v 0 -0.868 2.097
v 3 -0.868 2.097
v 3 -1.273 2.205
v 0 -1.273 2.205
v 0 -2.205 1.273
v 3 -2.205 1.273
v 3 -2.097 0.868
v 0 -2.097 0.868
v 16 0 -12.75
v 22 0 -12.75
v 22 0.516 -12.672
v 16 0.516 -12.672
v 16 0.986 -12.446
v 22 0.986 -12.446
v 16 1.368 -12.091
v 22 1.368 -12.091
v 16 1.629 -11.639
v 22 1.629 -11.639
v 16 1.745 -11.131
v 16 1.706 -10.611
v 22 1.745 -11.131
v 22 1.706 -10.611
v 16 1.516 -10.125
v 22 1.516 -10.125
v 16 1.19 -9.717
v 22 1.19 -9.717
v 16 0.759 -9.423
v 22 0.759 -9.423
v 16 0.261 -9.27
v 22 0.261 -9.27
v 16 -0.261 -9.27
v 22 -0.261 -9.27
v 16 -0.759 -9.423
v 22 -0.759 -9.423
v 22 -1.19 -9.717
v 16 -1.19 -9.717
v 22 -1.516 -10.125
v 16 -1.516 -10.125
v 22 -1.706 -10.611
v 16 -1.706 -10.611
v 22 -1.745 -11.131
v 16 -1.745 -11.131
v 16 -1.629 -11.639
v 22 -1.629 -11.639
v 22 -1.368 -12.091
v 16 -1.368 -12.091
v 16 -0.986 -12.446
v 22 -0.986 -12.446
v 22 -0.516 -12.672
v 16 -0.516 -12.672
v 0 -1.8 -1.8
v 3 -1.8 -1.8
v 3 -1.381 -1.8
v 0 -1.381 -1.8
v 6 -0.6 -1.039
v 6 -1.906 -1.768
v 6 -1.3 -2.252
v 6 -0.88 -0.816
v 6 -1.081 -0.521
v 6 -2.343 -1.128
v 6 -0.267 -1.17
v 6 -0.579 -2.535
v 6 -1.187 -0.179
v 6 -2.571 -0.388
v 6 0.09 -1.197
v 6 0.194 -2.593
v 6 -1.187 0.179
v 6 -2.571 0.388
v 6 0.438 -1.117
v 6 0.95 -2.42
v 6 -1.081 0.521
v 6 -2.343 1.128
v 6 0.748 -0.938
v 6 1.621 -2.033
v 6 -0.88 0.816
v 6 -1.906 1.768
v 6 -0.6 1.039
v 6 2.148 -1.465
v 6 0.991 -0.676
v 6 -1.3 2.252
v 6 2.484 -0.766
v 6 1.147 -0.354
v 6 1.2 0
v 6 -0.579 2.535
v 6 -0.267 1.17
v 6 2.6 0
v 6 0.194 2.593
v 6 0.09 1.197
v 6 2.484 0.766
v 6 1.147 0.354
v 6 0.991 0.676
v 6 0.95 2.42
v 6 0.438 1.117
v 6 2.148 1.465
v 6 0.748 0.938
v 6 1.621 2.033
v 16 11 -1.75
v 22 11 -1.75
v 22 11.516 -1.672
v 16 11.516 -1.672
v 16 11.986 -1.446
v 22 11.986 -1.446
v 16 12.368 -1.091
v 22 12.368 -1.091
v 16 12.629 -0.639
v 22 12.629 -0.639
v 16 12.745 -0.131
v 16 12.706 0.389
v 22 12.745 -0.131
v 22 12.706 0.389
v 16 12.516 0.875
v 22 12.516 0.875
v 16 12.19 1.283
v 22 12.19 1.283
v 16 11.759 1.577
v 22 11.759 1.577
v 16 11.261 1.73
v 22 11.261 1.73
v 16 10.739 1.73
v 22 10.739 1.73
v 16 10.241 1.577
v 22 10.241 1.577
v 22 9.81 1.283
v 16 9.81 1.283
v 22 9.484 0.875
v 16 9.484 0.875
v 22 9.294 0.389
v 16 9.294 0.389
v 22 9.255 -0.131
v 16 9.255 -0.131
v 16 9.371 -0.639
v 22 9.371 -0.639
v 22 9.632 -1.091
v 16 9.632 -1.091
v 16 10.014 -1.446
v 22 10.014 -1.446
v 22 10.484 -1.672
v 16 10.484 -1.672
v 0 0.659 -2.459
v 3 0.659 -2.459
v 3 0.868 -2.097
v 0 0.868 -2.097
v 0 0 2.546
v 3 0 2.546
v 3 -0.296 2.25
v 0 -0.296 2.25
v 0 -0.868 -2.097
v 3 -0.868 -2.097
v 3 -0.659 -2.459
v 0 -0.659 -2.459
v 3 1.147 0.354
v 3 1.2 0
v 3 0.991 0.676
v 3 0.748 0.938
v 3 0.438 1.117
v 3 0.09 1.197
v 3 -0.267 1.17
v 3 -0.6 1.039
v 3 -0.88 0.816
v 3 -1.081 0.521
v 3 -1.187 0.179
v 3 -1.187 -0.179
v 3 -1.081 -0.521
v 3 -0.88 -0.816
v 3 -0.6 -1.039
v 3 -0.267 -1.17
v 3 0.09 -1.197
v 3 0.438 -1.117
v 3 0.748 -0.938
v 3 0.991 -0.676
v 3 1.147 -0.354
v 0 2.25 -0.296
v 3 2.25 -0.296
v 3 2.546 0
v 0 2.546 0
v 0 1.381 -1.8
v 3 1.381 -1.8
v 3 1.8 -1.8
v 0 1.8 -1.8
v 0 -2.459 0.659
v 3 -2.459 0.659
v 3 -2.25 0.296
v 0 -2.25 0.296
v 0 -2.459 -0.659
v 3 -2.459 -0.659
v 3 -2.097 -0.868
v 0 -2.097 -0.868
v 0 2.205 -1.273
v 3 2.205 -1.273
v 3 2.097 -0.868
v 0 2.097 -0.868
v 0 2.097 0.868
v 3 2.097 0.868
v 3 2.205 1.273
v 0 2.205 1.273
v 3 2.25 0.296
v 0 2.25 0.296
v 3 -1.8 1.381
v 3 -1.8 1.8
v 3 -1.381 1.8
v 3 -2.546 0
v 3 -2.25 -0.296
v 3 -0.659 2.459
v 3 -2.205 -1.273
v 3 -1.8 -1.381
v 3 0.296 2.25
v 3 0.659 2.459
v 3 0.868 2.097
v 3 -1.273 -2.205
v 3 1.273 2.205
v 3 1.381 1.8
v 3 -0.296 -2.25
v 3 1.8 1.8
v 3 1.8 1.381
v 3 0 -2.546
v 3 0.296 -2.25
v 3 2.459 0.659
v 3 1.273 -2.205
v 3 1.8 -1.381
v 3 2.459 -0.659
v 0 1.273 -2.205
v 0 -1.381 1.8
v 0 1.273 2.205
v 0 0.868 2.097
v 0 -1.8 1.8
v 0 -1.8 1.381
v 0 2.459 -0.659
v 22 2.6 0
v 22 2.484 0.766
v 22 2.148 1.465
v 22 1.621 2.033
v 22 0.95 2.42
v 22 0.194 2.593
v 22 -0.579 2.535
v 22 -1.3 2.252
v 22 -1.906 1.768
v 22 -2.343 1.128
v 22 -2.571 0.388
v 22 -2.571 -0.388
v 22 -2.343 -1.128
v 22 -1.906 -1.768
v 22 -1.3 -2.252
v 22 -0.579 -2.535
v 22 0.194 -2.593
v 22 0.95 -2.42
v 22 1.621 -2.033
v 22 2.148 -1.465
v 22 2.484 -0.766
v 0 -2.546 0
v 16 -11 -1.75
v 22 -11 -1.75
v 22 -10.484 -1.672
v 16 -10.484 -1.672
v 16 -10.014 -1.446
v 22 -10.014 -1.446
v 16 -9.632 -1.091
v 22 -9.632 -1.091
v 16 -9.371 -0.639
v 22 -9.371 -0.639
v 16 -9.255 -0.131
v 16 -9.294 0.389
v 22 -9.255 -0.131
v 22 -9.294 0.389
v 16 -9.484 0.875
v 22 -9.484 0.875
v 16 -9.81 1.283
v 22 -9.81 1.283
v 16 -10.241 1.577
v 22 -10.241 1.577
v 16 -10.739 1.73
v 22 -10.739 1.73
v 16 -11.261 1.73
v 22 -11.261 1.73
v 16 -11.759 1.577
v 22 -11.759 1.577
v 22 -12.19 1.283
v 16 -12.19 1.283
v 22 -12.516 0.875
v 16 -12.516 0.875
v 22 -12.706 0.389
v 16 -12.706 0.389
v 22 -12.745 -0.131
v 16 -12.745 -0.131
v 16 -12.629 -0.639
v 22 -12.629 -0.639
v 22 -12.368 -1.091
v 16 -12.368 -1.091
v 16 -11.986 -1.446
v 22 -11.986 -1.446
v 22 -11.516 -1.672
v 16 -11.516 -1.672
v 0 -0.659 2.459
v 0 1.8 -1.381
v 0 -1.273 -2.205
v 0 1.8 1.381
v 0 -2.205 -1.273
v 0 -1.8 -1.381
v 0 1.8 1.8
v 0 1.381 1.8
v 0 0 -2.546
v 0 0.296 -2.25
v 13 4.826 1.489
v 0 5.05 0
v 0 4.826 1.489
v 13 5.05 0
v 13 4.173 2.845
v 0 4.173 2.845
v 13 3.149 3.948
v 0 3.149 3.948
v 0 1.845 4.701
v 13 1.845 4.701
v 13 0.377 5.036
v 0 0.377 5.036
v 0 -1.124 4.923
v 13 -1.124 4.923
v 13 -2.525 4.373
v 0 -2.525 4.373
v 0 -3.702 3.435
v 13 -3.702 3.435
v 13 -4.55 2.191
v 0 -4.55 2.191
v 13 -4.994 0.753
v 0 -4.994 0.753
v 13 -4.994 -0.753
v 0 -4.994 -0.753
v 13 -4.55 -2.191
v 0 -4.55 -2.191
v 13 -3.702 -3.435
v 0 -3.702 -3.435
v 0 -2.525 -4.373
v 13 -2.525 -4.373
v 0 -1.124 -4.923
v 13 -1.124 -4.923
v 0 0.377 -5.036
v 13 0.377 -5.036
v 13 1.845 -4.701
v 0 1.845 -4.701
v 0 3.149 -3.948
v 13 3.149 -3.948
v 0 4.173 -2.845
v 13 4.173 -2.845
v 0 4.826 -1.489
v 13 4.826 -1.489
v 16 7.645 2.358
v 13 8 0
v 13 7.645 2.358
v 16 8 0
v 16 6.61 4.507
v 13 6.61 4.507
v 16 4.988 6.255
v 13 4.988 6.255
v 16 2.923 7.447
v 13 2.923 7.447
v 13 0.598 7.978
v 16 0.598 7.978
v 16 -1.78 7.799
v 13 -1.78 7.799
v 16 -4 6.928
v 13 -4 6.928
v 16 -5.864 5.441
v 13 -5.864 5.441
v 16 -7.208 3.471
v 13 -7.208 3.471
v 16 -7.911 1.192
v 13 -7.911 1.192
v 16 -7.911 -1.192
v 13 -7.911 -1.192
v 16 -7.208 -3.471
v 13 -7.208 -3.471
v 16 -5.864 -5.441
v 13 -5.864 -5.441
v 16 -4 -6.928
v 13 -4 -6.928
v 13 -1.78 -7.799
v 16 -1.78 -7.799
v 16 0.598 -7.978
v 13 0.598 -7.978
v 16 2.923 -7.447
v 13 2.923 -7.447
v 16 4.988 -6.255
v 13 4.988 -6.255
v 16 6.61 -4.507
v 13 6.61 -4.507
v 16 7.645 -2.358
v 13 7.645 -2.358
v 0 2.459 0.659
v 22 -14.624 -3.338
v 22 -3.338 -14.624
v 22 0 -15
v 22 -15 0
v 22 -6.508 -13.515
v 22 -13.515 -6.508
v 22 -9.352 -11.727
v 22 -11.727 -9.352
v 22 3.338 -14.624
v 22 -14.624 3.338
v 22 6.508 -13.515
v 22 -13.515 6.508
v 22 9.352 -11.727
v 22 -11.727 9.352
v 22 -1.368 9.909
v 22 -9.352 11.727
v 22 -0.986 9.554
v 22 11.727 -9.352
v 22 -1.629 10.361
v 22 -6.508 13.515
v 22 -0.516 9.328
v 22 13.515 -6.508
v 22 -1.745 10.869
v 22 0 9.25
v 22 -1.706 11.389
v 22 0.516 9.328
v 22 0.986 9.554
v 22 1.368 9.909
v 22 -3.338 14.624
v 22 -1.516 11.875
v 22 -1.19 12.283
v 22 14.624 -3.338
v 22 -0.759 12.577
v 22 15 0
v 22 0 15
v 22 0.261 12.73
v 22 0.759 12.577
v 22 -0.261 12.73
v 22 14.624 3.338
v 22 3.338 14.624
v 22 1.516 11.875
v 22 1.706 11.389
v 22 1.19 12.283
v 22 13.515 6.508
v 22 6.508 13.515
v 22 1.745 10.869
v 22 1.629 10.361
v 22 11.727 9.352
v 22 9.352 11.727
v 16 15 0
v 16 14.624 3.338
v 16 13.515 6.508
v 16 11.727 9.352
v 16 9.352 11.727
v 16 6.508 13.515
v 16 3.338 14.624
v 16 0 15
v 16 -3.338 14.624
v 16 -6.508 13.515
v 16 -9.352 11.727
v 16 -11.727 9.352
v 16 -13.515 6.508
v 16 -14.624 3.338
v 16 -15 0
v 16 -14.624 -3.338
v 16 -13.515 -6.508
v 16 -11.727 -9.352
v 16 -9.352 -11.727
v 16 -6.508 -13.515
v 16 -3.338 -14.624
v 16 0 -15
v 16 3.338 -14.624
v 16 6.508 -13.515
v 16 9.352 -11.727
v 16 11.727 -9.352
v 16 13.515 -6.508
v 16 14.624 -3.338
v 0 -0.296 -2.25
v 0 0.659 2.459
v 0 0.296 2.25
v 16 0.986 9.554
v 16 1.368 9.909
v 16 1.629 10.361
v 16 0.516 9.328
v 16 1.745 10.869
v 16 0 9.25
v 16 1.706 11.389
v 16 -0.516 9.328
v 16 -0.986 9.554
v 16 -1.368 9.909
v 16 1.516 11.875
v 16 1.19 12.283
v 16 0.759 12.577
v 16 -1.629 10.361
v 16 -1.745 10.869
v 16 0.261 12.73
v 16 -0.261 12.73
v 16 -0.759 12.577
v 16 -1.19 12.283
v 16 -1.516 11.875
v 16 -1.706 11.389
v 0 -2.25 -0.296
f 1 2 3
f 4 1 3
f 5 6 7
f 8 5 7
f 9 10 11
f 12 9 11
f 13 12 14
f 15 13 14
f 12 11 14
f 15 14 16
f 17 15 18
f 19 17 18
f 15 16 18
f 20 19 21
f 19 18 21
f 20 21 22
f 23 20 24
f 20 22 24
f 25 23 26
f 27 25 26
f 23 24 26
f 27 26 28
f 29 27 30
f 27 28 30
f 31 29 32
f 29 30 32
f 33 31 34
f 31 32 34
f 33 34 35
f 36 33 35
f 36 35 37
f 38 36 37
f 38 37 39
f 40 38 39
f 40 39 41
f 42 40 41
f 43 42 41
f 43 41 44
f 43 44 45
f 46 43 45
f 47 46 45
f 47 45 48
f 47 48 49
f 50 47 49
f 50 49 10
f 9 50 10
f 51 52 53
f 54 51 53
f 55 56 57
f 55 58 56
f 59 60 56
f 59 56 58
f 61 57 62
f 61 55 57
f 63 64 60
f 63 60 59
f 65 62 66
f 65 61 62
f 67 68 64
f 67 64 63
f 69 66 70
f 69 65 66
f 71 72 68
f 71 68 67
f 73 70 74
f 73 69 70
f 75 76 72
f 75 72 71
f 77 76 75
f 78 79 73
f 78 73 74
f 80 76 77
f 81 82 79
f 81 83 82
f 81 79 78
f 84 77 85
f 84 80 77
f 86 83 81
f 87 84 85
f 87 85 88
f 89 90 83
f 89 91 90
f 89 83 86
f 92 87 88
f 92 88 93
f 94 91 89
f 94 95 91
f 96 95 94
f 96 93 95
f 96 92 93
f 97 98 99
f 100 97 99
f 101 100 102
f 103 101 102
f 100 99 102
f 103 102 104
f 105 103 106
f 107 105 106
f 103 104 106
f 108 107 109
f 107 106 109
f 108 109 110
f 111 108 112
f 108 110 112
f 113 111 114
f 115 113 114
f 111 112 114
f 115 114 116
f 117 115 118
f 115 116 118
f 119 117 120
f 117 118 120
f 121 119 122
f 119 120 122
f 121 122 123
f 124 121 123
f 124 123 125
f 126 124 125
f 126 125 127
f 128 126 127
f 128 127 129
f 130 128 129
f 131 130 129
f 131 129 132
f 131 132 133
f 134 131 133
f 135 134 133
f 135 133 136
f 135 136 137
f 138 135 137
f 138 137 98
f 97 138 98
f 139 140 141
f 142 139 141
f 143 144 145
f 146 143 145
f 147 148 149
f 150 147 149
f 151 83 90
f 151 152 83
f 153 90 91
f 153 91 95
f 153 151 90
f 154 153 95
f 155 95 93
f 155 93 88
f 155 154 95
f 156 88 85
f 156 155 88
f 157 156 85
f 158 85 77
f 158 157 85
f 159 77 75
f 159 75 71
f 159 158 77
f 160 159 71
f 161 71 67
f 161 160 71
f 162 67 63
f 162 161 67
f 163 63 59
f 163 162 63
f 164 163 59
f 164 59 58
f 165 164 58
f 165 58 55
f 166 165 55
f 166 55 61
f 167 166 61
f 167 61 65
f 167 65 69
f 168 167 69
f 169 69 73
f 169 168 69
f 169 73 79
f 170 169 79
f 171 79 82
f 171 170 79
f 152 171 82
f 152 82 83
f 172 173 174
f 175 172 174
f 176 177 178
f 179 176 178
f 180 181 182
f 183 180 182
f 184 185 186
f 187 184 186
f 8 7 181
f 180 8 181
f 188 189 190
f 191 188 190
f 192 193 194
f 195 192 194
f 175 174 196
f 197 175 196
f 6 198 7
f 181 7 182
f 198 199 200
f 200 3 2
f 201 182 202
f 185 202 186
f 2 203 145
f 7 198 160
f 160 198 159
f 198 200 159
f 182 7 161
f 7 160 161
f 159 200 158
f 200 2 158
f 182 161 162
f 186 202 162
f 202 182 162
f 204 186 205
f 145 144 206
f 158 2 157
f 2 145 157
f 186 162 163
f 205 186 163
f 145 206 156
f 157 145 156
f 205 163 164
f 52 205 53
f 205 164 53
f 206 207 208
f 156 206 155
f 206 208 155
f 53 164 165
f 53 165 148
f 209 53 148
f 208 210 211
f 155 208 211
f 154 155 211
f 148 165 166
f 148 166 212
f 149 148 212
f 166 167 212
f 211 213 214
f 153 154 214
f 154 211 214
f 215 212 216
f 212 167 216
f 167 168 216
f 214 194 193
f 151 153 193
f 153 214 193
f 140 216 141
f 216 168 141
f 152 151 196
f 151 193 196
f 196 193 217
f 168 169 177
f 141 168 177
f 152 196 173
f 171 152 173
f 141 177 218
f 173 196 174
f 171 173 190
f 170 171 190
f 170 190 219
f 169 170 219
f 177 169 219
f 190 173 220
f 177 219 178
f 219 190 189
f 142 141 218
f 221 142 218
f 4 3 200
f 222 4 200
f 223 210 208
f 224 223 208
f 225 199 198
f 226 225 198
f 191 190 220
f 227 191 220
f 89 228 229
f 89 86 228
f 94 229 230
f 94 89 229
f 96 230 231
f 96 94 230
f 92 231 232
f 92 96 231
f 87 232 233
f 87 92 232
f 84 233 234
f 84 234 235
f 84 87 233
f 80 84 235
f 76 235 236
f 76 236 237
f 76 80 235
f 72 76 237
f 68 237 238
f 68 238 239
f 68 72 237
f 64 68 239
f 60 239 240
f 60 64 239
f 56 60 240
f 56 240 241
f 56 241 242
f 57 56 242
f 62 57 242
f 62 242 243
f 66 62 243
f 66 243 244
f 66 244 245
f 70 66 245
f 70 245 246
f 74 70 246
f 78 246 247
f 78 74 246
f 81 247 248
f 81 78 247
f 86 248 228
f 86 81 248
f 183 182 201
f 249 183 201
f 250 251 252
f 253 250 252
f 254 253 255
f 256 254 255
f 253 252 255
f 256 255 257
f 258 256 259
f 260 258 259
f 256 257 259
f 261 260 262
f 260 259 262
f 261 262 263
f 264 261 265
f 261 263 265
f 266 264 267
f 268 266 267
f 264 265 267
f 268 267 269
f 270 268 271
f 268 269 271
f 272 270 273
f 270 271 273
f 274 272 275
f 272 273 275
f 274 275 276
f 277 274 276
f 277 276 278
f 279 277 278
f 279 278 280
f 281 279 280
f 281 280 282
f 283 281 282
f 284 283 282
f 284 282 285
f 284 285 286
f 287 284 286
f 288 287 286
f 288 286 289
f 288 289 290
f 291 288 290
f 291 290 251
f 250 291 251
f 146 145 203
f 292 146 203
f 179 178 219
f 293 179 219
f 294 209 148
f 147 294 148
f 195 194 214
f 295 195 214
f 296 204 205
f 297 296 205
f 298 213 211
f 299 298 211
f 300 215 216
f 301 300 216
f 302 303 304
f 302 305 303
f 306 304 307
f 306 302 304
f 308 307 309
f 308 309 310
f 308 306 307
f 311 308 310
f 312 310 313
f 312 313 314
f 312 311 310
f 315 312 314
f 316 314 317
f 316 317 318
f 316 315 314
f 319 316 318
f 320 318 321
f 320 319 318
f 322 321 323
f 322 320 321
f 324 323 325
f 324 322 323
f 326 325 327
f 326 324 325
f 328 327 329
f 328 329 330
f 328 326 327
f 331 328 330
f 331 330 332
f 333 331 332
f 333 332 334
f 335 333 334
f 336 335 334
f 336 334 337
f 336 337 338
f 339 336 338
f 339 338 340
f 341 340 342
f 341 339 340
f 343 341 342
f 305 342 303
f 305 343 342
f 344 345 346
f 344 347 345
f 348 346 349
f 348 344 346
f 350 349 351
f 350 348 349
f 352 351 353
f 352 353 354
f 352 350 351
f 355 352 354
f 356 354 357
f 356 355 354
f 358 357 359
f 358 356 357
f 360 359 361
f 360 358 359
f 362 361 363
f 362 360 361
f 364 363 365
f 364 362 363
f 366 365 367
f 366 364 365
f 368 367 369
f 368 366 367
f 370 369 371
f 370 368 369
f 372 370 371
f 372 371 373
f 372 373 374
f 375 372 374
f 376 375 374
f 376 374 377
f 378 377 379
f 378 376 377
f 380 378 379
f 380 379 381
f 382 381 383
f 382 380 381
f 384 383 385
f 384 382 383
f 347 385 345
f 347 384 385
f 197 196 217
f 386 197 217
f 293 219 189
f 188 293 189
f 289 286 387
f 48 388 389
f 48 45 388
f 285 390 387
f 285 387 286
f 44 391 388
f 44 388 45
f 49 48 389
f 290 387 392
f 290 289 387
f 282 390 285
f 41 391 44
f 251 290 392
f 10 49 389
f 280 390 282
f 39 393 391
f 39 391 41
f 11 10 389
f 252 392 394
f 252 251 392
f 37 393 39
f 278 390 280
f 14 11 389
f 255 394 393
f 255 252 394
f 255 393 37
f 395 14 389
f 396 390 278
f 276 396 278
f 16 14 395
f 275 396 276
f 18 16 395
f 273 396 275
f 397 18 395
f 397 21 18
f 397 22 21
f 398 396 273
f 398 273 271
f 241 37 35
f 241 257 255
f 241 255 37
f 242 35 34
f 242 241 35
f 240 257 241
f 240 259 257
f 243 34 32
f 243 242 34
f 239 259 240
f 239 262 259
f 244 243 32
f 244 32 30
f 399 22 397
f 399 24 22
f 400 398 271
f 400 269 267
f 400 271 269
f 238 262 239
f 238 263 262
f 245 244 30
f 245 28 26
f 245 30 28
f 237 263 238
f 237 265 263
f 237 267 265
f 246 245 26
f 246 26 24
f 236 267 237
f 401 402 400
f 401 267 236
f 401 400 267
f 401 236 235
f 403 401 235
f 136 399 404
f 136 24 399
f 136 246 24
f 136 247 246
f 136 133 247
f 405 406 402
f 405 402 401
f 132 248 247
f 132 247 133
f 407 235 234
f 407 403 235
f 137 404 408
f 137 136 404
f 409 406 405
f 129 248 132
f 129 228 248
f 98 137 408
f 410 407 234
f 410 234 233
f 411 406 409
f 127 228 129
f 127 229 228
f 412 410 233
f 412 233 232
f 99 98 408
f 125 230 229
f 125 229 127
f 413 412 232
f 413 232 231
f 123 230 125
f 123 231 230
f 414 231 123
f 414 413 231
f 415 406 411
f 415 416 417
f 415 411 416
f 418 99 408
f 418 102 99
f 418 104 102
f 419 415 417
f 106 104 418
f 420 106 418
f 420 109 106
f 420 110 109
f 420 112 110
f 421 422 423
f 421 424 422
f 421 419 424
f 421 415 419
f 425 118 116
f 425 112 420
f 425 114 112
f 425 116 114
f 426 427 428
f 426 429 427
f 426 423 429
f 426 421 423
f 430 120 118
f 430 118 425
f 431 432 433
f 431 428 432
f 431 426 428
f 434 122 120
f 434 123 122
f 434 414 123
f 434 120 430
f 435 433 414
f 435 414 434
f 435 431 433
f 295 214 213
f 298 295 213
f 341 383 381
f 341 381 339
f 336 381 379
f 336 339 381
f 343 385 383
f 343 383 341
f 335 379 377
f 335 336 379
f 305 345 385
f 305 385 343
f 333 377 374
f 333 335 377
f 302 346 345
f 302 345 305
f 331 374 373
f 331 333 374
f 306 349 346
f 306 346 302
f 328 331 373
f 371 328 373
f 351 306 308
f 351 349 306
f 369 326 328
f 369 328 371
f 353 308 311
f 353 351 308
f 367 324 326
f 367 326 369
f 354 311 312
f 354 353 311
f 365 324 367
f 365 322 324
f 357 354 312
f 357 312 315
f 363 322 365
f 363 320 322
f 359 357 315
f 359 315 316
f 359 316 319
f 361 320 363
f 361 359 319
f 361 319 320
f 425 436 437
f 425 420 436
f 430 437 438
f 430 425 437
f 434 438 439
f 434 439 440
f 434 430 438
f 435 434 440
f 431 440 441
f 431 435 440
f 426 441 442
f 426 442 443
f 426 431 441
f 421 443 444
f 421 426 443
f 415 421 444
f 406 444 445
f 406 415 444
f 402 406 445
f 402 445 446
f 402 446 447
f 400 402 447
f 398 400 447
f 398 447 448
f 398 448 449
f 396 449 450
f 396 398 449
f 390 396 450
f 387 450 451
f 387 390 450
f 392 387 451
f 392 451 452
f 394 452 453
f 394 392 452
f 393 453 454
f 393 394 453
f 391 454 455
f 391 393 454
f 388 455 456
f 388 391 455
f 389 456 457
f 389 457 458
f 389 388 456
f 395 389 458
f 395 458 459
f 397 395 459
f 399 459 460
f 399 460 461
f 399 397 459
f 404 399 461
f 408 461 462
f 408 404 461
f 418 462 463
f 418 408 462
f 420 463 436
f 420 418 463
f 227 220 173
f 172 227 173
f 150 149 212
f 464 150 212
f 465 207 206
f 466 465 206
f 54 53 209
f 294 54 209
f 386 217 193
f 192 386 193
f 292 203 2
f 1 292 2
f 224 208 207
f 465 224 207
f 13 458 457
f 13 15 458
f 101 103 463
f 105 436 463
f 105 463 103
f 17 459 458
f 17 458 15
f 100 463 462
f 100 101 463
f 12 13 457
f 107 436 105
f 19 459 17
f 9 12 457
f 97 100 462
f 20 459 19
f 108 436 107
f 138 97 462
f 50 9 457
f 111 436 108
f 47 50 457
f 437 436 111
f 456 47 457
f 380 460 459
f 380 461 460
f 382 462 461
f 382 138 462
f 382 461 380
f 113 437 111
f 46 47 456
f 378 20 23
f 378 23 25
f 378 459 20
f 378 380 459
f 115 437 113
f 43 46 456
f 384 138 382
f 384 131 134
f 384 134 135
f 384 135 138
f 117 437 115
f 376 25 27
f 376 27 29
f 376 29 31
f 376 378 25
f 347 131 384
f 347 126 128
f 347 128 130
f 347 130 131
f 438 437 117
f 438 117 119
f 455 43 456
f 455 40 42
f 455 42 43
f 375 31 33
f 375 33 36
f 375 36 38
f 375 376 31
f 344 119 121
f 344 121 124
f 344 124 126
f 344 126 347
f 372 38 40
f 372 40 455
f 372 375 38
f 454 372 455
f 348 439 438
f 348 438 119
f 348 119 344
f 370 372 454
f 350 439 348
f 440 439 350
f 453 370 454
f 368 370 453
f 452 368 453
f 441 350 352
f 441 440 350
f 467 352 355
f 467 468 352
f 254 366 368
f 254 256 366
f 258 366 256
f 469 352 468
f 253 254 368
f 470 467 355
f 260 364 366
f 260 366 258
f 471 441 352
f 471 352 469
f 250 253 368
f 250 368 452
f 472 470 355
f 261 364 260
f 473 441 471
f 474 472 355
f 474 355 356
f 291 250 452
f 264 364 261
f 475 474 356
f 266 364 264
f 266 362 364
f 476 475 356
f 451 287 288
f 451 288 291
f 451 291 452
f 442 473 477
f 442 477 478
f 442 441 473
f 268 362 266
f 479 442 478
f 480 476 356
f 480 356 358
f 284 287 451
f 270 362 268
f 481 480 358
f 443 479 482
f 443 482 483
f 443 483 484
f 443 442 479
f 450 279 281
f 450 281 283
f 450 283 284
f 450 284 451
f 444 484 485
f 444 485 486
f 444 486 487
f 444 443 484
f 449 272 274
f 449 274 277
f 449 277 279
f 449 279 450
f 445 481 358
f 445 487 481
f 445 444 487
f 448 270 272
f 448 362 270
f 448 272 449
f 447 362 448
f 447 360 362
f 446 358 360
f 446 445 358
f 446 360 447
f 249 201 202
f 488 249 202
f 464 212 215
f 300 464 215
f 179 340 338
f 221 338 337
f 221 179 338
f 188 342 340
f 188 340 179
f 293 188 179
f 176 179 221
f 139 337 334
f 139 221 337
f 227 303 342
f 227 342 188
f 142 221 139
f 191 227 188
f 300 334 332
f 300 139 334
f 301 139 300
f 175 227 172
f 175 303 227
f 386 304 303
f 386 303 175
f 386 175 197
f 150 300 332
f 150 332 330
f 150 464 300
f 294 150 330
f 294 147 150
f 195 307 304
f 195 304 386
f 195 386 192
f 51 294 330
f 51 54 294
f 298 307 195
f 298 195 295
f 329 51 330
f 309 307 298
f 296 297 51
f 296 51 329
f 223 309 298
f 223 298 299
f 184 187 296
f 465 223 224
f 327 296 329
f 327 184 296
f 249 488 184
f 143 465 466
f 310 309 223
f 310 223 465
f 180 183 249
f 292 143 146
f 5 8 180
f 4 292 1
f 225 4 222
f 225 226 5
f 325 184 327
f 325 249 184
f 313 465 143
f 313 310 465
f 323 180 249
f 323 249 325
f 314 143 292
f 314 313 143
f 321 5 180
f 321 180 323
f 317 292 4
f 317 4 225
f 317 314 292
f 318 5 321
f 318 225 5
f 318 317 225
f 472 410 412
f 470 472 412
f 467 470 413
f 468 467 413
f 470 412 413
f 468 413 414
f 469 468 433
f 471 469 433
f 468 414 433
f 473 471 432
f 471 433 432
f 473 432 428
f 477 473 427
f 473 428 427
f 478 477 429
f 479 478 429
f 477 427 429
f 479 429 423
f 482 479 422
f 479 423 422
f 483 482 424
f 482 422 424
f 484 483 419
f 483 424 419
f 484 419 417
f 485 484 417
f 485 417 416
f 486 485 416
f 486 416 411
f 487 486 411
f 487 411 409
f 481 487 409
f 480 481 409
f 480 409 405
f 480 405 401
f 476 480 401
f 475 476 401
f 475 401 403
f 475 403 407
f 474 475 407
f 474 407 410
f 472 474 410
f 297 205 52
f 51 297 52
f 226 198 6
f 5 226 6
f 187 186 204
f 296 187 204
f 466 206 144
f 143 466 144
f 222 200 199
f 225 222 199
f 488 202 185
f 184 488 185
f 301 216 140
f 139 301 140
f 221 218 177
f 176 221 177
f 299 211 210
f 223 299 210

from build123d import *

# Parameters (mm, degrees)
ENL_V_MAT_EXTRU_1_REACH      = 24
ESQUISSE2_R                  = 1.75
ENL_V_MAT_EXTRU_2_DEPTH      = 10
R_P_TITION_CIRCULAIRE1_COUNT = 24


with BuildPart() as part:
    # Esquisse1 → Révolution1 (revolve)
    with BuildSketch(Plane.XY):
        Polygon((0, 2.25), (0, 5.05), (13, 5.05), (13, 8), (16, 8), (16, 15), (22, 15), (22, 2.6), (6, 2.6), (6, 1.2), (3, 1.2), (3, 2.25), align=None)
    revolve(axis=Axis((0, 0, 0), (1, 0, 0)))

    # Esquisse2 → Enlèv. mat.-Extru.1 (cut, up to next)
    with BuildSketch(Plane(origin=(22, 0, 0), x_dir=(0, 0, -1), z_dir=(1, 0, 0)), mode=Mode.PRIVATE) as enl_v_mat_extru_1_sk1:
        with Locations((0, 11)):
            Circle(ESQUISSE2_R)
    enl_v_mat_extru_1_tool1 = extrude(enl_v_mat_extru_1_sk1.sketch, amount=-ENL_V_MAT_EXTRU_1_REACH, mode=Mode.PRIVATE) & part.part
    add(enl_v_mat_extru_1_tool1.solids().sort_by_distance((22, 11, 0))[0], mode=Mode.SUBTRACT)
    # Esquisse2 → Enlèv. mat.-Extru.1 (cut, up to next)
    with BuildSketch(Plane(origin=(22, 0, 0), x_dir=(0, 0, -1), z_dir=(1, 0, 0)), mode=Mode.PRIVATE) as enl_v_mat_extru_1_sk2:
        with Locations((11, 0)):
            Circle(ESQUISSE2_R)
    enl_v_mat_extru_1_tool2 = extrude(enl_v_mat_extru_1_sk2.sketch, amount=-ENL_V_MAT_EXTRU_1_REACH, mode=Mode.PRIVATE) & part.part
    add(enl_v_mat_extru_1_tool2.solids().sort_by_distance((22, 0, -11))[0], mode=Mode.SUBTRACT)
    # Esquisse2 → Enlèv. mat.-Extru.1 (cut, up to next)
    with BuildSketch(Plane(origin=(22, 0, 0), x_dir=(0, 0, -1), z_dir=(1, 0, 0)), mode=Mode.PRIVATE) as enl_v_mat_extru_1_sk3:
        with Locations((0, -11)):
            Circle(ESQUISSE2_R)
    enl_v_mat_extru_1_tool3 = extrude(enl_v_mat_extru_1_sk3.sketch, amount=-ENL_V_MAT_EXTRU_1_REACH, mode=Mode.PRIVATE) & part.part
    add(enl_v_mat_extru_1_tool3.solids().sort_by_distance((22, -11, 0))[0], mode=Mode.SUBTRACT)
    # Esquisse2 → Enlèv. mat.-Extru.1 (cut, up to next)
    with BuildSketch(Plane(origin=(22, 0, 0), x_dir=(0, 0, -1), z_dir=(1, 0, 0)), mode=Mode.PRIVATE) as enl_v_mat_extru_1_sk4:
        with Locations((-11, 0)):
            Circle(ESQUISSE2_R)
    enl_v_mat_extru_1_tool4 = extrude(enl_v_mat_extru_1_sk4.sketch, amount=-ENL_V_MAT_EXTRU_1_REACH, mode=Mode.PRIVATE) & part.part
    add(enl_v_mat_extru_1_tool4.solids().sort_by_distance((22, 0, 11))[0], mode=Mode.SUBTRACT)

    # Esquisse3 → Enlèv. mat.-Extru.2 (cut)
    with BuildSketch(Plane.ZY.offset(-3)):
        Polygon((2.54609184, 0), (2.163423814, -0.382668026), (2.164412287, 0.381679553), align=None)
    enl_v_mat_extru_2 = extrude(amount=ENL_V_MAT_EXTRU_2_DEPTH, mode=Mode.SUBTRACT)

    # Répétition circulaire1: Enlèv. mat.-Extru.2 ×24 about axis
    r_p_tition_circulaire1_axis = Axis((0, 0, 0), (1, 0, 0))
    for i in range(1, R_P_TITION_CIRCULAIRE1_COUNT):
        add(enl_v_mat_extru_2.rotate(r_p_tition_circulaire1_axis, i * 360 / R_P_TITION_CIRCULAIRE1_COUNT), mode=Mode.SUBTRACT)


solid = part.part
